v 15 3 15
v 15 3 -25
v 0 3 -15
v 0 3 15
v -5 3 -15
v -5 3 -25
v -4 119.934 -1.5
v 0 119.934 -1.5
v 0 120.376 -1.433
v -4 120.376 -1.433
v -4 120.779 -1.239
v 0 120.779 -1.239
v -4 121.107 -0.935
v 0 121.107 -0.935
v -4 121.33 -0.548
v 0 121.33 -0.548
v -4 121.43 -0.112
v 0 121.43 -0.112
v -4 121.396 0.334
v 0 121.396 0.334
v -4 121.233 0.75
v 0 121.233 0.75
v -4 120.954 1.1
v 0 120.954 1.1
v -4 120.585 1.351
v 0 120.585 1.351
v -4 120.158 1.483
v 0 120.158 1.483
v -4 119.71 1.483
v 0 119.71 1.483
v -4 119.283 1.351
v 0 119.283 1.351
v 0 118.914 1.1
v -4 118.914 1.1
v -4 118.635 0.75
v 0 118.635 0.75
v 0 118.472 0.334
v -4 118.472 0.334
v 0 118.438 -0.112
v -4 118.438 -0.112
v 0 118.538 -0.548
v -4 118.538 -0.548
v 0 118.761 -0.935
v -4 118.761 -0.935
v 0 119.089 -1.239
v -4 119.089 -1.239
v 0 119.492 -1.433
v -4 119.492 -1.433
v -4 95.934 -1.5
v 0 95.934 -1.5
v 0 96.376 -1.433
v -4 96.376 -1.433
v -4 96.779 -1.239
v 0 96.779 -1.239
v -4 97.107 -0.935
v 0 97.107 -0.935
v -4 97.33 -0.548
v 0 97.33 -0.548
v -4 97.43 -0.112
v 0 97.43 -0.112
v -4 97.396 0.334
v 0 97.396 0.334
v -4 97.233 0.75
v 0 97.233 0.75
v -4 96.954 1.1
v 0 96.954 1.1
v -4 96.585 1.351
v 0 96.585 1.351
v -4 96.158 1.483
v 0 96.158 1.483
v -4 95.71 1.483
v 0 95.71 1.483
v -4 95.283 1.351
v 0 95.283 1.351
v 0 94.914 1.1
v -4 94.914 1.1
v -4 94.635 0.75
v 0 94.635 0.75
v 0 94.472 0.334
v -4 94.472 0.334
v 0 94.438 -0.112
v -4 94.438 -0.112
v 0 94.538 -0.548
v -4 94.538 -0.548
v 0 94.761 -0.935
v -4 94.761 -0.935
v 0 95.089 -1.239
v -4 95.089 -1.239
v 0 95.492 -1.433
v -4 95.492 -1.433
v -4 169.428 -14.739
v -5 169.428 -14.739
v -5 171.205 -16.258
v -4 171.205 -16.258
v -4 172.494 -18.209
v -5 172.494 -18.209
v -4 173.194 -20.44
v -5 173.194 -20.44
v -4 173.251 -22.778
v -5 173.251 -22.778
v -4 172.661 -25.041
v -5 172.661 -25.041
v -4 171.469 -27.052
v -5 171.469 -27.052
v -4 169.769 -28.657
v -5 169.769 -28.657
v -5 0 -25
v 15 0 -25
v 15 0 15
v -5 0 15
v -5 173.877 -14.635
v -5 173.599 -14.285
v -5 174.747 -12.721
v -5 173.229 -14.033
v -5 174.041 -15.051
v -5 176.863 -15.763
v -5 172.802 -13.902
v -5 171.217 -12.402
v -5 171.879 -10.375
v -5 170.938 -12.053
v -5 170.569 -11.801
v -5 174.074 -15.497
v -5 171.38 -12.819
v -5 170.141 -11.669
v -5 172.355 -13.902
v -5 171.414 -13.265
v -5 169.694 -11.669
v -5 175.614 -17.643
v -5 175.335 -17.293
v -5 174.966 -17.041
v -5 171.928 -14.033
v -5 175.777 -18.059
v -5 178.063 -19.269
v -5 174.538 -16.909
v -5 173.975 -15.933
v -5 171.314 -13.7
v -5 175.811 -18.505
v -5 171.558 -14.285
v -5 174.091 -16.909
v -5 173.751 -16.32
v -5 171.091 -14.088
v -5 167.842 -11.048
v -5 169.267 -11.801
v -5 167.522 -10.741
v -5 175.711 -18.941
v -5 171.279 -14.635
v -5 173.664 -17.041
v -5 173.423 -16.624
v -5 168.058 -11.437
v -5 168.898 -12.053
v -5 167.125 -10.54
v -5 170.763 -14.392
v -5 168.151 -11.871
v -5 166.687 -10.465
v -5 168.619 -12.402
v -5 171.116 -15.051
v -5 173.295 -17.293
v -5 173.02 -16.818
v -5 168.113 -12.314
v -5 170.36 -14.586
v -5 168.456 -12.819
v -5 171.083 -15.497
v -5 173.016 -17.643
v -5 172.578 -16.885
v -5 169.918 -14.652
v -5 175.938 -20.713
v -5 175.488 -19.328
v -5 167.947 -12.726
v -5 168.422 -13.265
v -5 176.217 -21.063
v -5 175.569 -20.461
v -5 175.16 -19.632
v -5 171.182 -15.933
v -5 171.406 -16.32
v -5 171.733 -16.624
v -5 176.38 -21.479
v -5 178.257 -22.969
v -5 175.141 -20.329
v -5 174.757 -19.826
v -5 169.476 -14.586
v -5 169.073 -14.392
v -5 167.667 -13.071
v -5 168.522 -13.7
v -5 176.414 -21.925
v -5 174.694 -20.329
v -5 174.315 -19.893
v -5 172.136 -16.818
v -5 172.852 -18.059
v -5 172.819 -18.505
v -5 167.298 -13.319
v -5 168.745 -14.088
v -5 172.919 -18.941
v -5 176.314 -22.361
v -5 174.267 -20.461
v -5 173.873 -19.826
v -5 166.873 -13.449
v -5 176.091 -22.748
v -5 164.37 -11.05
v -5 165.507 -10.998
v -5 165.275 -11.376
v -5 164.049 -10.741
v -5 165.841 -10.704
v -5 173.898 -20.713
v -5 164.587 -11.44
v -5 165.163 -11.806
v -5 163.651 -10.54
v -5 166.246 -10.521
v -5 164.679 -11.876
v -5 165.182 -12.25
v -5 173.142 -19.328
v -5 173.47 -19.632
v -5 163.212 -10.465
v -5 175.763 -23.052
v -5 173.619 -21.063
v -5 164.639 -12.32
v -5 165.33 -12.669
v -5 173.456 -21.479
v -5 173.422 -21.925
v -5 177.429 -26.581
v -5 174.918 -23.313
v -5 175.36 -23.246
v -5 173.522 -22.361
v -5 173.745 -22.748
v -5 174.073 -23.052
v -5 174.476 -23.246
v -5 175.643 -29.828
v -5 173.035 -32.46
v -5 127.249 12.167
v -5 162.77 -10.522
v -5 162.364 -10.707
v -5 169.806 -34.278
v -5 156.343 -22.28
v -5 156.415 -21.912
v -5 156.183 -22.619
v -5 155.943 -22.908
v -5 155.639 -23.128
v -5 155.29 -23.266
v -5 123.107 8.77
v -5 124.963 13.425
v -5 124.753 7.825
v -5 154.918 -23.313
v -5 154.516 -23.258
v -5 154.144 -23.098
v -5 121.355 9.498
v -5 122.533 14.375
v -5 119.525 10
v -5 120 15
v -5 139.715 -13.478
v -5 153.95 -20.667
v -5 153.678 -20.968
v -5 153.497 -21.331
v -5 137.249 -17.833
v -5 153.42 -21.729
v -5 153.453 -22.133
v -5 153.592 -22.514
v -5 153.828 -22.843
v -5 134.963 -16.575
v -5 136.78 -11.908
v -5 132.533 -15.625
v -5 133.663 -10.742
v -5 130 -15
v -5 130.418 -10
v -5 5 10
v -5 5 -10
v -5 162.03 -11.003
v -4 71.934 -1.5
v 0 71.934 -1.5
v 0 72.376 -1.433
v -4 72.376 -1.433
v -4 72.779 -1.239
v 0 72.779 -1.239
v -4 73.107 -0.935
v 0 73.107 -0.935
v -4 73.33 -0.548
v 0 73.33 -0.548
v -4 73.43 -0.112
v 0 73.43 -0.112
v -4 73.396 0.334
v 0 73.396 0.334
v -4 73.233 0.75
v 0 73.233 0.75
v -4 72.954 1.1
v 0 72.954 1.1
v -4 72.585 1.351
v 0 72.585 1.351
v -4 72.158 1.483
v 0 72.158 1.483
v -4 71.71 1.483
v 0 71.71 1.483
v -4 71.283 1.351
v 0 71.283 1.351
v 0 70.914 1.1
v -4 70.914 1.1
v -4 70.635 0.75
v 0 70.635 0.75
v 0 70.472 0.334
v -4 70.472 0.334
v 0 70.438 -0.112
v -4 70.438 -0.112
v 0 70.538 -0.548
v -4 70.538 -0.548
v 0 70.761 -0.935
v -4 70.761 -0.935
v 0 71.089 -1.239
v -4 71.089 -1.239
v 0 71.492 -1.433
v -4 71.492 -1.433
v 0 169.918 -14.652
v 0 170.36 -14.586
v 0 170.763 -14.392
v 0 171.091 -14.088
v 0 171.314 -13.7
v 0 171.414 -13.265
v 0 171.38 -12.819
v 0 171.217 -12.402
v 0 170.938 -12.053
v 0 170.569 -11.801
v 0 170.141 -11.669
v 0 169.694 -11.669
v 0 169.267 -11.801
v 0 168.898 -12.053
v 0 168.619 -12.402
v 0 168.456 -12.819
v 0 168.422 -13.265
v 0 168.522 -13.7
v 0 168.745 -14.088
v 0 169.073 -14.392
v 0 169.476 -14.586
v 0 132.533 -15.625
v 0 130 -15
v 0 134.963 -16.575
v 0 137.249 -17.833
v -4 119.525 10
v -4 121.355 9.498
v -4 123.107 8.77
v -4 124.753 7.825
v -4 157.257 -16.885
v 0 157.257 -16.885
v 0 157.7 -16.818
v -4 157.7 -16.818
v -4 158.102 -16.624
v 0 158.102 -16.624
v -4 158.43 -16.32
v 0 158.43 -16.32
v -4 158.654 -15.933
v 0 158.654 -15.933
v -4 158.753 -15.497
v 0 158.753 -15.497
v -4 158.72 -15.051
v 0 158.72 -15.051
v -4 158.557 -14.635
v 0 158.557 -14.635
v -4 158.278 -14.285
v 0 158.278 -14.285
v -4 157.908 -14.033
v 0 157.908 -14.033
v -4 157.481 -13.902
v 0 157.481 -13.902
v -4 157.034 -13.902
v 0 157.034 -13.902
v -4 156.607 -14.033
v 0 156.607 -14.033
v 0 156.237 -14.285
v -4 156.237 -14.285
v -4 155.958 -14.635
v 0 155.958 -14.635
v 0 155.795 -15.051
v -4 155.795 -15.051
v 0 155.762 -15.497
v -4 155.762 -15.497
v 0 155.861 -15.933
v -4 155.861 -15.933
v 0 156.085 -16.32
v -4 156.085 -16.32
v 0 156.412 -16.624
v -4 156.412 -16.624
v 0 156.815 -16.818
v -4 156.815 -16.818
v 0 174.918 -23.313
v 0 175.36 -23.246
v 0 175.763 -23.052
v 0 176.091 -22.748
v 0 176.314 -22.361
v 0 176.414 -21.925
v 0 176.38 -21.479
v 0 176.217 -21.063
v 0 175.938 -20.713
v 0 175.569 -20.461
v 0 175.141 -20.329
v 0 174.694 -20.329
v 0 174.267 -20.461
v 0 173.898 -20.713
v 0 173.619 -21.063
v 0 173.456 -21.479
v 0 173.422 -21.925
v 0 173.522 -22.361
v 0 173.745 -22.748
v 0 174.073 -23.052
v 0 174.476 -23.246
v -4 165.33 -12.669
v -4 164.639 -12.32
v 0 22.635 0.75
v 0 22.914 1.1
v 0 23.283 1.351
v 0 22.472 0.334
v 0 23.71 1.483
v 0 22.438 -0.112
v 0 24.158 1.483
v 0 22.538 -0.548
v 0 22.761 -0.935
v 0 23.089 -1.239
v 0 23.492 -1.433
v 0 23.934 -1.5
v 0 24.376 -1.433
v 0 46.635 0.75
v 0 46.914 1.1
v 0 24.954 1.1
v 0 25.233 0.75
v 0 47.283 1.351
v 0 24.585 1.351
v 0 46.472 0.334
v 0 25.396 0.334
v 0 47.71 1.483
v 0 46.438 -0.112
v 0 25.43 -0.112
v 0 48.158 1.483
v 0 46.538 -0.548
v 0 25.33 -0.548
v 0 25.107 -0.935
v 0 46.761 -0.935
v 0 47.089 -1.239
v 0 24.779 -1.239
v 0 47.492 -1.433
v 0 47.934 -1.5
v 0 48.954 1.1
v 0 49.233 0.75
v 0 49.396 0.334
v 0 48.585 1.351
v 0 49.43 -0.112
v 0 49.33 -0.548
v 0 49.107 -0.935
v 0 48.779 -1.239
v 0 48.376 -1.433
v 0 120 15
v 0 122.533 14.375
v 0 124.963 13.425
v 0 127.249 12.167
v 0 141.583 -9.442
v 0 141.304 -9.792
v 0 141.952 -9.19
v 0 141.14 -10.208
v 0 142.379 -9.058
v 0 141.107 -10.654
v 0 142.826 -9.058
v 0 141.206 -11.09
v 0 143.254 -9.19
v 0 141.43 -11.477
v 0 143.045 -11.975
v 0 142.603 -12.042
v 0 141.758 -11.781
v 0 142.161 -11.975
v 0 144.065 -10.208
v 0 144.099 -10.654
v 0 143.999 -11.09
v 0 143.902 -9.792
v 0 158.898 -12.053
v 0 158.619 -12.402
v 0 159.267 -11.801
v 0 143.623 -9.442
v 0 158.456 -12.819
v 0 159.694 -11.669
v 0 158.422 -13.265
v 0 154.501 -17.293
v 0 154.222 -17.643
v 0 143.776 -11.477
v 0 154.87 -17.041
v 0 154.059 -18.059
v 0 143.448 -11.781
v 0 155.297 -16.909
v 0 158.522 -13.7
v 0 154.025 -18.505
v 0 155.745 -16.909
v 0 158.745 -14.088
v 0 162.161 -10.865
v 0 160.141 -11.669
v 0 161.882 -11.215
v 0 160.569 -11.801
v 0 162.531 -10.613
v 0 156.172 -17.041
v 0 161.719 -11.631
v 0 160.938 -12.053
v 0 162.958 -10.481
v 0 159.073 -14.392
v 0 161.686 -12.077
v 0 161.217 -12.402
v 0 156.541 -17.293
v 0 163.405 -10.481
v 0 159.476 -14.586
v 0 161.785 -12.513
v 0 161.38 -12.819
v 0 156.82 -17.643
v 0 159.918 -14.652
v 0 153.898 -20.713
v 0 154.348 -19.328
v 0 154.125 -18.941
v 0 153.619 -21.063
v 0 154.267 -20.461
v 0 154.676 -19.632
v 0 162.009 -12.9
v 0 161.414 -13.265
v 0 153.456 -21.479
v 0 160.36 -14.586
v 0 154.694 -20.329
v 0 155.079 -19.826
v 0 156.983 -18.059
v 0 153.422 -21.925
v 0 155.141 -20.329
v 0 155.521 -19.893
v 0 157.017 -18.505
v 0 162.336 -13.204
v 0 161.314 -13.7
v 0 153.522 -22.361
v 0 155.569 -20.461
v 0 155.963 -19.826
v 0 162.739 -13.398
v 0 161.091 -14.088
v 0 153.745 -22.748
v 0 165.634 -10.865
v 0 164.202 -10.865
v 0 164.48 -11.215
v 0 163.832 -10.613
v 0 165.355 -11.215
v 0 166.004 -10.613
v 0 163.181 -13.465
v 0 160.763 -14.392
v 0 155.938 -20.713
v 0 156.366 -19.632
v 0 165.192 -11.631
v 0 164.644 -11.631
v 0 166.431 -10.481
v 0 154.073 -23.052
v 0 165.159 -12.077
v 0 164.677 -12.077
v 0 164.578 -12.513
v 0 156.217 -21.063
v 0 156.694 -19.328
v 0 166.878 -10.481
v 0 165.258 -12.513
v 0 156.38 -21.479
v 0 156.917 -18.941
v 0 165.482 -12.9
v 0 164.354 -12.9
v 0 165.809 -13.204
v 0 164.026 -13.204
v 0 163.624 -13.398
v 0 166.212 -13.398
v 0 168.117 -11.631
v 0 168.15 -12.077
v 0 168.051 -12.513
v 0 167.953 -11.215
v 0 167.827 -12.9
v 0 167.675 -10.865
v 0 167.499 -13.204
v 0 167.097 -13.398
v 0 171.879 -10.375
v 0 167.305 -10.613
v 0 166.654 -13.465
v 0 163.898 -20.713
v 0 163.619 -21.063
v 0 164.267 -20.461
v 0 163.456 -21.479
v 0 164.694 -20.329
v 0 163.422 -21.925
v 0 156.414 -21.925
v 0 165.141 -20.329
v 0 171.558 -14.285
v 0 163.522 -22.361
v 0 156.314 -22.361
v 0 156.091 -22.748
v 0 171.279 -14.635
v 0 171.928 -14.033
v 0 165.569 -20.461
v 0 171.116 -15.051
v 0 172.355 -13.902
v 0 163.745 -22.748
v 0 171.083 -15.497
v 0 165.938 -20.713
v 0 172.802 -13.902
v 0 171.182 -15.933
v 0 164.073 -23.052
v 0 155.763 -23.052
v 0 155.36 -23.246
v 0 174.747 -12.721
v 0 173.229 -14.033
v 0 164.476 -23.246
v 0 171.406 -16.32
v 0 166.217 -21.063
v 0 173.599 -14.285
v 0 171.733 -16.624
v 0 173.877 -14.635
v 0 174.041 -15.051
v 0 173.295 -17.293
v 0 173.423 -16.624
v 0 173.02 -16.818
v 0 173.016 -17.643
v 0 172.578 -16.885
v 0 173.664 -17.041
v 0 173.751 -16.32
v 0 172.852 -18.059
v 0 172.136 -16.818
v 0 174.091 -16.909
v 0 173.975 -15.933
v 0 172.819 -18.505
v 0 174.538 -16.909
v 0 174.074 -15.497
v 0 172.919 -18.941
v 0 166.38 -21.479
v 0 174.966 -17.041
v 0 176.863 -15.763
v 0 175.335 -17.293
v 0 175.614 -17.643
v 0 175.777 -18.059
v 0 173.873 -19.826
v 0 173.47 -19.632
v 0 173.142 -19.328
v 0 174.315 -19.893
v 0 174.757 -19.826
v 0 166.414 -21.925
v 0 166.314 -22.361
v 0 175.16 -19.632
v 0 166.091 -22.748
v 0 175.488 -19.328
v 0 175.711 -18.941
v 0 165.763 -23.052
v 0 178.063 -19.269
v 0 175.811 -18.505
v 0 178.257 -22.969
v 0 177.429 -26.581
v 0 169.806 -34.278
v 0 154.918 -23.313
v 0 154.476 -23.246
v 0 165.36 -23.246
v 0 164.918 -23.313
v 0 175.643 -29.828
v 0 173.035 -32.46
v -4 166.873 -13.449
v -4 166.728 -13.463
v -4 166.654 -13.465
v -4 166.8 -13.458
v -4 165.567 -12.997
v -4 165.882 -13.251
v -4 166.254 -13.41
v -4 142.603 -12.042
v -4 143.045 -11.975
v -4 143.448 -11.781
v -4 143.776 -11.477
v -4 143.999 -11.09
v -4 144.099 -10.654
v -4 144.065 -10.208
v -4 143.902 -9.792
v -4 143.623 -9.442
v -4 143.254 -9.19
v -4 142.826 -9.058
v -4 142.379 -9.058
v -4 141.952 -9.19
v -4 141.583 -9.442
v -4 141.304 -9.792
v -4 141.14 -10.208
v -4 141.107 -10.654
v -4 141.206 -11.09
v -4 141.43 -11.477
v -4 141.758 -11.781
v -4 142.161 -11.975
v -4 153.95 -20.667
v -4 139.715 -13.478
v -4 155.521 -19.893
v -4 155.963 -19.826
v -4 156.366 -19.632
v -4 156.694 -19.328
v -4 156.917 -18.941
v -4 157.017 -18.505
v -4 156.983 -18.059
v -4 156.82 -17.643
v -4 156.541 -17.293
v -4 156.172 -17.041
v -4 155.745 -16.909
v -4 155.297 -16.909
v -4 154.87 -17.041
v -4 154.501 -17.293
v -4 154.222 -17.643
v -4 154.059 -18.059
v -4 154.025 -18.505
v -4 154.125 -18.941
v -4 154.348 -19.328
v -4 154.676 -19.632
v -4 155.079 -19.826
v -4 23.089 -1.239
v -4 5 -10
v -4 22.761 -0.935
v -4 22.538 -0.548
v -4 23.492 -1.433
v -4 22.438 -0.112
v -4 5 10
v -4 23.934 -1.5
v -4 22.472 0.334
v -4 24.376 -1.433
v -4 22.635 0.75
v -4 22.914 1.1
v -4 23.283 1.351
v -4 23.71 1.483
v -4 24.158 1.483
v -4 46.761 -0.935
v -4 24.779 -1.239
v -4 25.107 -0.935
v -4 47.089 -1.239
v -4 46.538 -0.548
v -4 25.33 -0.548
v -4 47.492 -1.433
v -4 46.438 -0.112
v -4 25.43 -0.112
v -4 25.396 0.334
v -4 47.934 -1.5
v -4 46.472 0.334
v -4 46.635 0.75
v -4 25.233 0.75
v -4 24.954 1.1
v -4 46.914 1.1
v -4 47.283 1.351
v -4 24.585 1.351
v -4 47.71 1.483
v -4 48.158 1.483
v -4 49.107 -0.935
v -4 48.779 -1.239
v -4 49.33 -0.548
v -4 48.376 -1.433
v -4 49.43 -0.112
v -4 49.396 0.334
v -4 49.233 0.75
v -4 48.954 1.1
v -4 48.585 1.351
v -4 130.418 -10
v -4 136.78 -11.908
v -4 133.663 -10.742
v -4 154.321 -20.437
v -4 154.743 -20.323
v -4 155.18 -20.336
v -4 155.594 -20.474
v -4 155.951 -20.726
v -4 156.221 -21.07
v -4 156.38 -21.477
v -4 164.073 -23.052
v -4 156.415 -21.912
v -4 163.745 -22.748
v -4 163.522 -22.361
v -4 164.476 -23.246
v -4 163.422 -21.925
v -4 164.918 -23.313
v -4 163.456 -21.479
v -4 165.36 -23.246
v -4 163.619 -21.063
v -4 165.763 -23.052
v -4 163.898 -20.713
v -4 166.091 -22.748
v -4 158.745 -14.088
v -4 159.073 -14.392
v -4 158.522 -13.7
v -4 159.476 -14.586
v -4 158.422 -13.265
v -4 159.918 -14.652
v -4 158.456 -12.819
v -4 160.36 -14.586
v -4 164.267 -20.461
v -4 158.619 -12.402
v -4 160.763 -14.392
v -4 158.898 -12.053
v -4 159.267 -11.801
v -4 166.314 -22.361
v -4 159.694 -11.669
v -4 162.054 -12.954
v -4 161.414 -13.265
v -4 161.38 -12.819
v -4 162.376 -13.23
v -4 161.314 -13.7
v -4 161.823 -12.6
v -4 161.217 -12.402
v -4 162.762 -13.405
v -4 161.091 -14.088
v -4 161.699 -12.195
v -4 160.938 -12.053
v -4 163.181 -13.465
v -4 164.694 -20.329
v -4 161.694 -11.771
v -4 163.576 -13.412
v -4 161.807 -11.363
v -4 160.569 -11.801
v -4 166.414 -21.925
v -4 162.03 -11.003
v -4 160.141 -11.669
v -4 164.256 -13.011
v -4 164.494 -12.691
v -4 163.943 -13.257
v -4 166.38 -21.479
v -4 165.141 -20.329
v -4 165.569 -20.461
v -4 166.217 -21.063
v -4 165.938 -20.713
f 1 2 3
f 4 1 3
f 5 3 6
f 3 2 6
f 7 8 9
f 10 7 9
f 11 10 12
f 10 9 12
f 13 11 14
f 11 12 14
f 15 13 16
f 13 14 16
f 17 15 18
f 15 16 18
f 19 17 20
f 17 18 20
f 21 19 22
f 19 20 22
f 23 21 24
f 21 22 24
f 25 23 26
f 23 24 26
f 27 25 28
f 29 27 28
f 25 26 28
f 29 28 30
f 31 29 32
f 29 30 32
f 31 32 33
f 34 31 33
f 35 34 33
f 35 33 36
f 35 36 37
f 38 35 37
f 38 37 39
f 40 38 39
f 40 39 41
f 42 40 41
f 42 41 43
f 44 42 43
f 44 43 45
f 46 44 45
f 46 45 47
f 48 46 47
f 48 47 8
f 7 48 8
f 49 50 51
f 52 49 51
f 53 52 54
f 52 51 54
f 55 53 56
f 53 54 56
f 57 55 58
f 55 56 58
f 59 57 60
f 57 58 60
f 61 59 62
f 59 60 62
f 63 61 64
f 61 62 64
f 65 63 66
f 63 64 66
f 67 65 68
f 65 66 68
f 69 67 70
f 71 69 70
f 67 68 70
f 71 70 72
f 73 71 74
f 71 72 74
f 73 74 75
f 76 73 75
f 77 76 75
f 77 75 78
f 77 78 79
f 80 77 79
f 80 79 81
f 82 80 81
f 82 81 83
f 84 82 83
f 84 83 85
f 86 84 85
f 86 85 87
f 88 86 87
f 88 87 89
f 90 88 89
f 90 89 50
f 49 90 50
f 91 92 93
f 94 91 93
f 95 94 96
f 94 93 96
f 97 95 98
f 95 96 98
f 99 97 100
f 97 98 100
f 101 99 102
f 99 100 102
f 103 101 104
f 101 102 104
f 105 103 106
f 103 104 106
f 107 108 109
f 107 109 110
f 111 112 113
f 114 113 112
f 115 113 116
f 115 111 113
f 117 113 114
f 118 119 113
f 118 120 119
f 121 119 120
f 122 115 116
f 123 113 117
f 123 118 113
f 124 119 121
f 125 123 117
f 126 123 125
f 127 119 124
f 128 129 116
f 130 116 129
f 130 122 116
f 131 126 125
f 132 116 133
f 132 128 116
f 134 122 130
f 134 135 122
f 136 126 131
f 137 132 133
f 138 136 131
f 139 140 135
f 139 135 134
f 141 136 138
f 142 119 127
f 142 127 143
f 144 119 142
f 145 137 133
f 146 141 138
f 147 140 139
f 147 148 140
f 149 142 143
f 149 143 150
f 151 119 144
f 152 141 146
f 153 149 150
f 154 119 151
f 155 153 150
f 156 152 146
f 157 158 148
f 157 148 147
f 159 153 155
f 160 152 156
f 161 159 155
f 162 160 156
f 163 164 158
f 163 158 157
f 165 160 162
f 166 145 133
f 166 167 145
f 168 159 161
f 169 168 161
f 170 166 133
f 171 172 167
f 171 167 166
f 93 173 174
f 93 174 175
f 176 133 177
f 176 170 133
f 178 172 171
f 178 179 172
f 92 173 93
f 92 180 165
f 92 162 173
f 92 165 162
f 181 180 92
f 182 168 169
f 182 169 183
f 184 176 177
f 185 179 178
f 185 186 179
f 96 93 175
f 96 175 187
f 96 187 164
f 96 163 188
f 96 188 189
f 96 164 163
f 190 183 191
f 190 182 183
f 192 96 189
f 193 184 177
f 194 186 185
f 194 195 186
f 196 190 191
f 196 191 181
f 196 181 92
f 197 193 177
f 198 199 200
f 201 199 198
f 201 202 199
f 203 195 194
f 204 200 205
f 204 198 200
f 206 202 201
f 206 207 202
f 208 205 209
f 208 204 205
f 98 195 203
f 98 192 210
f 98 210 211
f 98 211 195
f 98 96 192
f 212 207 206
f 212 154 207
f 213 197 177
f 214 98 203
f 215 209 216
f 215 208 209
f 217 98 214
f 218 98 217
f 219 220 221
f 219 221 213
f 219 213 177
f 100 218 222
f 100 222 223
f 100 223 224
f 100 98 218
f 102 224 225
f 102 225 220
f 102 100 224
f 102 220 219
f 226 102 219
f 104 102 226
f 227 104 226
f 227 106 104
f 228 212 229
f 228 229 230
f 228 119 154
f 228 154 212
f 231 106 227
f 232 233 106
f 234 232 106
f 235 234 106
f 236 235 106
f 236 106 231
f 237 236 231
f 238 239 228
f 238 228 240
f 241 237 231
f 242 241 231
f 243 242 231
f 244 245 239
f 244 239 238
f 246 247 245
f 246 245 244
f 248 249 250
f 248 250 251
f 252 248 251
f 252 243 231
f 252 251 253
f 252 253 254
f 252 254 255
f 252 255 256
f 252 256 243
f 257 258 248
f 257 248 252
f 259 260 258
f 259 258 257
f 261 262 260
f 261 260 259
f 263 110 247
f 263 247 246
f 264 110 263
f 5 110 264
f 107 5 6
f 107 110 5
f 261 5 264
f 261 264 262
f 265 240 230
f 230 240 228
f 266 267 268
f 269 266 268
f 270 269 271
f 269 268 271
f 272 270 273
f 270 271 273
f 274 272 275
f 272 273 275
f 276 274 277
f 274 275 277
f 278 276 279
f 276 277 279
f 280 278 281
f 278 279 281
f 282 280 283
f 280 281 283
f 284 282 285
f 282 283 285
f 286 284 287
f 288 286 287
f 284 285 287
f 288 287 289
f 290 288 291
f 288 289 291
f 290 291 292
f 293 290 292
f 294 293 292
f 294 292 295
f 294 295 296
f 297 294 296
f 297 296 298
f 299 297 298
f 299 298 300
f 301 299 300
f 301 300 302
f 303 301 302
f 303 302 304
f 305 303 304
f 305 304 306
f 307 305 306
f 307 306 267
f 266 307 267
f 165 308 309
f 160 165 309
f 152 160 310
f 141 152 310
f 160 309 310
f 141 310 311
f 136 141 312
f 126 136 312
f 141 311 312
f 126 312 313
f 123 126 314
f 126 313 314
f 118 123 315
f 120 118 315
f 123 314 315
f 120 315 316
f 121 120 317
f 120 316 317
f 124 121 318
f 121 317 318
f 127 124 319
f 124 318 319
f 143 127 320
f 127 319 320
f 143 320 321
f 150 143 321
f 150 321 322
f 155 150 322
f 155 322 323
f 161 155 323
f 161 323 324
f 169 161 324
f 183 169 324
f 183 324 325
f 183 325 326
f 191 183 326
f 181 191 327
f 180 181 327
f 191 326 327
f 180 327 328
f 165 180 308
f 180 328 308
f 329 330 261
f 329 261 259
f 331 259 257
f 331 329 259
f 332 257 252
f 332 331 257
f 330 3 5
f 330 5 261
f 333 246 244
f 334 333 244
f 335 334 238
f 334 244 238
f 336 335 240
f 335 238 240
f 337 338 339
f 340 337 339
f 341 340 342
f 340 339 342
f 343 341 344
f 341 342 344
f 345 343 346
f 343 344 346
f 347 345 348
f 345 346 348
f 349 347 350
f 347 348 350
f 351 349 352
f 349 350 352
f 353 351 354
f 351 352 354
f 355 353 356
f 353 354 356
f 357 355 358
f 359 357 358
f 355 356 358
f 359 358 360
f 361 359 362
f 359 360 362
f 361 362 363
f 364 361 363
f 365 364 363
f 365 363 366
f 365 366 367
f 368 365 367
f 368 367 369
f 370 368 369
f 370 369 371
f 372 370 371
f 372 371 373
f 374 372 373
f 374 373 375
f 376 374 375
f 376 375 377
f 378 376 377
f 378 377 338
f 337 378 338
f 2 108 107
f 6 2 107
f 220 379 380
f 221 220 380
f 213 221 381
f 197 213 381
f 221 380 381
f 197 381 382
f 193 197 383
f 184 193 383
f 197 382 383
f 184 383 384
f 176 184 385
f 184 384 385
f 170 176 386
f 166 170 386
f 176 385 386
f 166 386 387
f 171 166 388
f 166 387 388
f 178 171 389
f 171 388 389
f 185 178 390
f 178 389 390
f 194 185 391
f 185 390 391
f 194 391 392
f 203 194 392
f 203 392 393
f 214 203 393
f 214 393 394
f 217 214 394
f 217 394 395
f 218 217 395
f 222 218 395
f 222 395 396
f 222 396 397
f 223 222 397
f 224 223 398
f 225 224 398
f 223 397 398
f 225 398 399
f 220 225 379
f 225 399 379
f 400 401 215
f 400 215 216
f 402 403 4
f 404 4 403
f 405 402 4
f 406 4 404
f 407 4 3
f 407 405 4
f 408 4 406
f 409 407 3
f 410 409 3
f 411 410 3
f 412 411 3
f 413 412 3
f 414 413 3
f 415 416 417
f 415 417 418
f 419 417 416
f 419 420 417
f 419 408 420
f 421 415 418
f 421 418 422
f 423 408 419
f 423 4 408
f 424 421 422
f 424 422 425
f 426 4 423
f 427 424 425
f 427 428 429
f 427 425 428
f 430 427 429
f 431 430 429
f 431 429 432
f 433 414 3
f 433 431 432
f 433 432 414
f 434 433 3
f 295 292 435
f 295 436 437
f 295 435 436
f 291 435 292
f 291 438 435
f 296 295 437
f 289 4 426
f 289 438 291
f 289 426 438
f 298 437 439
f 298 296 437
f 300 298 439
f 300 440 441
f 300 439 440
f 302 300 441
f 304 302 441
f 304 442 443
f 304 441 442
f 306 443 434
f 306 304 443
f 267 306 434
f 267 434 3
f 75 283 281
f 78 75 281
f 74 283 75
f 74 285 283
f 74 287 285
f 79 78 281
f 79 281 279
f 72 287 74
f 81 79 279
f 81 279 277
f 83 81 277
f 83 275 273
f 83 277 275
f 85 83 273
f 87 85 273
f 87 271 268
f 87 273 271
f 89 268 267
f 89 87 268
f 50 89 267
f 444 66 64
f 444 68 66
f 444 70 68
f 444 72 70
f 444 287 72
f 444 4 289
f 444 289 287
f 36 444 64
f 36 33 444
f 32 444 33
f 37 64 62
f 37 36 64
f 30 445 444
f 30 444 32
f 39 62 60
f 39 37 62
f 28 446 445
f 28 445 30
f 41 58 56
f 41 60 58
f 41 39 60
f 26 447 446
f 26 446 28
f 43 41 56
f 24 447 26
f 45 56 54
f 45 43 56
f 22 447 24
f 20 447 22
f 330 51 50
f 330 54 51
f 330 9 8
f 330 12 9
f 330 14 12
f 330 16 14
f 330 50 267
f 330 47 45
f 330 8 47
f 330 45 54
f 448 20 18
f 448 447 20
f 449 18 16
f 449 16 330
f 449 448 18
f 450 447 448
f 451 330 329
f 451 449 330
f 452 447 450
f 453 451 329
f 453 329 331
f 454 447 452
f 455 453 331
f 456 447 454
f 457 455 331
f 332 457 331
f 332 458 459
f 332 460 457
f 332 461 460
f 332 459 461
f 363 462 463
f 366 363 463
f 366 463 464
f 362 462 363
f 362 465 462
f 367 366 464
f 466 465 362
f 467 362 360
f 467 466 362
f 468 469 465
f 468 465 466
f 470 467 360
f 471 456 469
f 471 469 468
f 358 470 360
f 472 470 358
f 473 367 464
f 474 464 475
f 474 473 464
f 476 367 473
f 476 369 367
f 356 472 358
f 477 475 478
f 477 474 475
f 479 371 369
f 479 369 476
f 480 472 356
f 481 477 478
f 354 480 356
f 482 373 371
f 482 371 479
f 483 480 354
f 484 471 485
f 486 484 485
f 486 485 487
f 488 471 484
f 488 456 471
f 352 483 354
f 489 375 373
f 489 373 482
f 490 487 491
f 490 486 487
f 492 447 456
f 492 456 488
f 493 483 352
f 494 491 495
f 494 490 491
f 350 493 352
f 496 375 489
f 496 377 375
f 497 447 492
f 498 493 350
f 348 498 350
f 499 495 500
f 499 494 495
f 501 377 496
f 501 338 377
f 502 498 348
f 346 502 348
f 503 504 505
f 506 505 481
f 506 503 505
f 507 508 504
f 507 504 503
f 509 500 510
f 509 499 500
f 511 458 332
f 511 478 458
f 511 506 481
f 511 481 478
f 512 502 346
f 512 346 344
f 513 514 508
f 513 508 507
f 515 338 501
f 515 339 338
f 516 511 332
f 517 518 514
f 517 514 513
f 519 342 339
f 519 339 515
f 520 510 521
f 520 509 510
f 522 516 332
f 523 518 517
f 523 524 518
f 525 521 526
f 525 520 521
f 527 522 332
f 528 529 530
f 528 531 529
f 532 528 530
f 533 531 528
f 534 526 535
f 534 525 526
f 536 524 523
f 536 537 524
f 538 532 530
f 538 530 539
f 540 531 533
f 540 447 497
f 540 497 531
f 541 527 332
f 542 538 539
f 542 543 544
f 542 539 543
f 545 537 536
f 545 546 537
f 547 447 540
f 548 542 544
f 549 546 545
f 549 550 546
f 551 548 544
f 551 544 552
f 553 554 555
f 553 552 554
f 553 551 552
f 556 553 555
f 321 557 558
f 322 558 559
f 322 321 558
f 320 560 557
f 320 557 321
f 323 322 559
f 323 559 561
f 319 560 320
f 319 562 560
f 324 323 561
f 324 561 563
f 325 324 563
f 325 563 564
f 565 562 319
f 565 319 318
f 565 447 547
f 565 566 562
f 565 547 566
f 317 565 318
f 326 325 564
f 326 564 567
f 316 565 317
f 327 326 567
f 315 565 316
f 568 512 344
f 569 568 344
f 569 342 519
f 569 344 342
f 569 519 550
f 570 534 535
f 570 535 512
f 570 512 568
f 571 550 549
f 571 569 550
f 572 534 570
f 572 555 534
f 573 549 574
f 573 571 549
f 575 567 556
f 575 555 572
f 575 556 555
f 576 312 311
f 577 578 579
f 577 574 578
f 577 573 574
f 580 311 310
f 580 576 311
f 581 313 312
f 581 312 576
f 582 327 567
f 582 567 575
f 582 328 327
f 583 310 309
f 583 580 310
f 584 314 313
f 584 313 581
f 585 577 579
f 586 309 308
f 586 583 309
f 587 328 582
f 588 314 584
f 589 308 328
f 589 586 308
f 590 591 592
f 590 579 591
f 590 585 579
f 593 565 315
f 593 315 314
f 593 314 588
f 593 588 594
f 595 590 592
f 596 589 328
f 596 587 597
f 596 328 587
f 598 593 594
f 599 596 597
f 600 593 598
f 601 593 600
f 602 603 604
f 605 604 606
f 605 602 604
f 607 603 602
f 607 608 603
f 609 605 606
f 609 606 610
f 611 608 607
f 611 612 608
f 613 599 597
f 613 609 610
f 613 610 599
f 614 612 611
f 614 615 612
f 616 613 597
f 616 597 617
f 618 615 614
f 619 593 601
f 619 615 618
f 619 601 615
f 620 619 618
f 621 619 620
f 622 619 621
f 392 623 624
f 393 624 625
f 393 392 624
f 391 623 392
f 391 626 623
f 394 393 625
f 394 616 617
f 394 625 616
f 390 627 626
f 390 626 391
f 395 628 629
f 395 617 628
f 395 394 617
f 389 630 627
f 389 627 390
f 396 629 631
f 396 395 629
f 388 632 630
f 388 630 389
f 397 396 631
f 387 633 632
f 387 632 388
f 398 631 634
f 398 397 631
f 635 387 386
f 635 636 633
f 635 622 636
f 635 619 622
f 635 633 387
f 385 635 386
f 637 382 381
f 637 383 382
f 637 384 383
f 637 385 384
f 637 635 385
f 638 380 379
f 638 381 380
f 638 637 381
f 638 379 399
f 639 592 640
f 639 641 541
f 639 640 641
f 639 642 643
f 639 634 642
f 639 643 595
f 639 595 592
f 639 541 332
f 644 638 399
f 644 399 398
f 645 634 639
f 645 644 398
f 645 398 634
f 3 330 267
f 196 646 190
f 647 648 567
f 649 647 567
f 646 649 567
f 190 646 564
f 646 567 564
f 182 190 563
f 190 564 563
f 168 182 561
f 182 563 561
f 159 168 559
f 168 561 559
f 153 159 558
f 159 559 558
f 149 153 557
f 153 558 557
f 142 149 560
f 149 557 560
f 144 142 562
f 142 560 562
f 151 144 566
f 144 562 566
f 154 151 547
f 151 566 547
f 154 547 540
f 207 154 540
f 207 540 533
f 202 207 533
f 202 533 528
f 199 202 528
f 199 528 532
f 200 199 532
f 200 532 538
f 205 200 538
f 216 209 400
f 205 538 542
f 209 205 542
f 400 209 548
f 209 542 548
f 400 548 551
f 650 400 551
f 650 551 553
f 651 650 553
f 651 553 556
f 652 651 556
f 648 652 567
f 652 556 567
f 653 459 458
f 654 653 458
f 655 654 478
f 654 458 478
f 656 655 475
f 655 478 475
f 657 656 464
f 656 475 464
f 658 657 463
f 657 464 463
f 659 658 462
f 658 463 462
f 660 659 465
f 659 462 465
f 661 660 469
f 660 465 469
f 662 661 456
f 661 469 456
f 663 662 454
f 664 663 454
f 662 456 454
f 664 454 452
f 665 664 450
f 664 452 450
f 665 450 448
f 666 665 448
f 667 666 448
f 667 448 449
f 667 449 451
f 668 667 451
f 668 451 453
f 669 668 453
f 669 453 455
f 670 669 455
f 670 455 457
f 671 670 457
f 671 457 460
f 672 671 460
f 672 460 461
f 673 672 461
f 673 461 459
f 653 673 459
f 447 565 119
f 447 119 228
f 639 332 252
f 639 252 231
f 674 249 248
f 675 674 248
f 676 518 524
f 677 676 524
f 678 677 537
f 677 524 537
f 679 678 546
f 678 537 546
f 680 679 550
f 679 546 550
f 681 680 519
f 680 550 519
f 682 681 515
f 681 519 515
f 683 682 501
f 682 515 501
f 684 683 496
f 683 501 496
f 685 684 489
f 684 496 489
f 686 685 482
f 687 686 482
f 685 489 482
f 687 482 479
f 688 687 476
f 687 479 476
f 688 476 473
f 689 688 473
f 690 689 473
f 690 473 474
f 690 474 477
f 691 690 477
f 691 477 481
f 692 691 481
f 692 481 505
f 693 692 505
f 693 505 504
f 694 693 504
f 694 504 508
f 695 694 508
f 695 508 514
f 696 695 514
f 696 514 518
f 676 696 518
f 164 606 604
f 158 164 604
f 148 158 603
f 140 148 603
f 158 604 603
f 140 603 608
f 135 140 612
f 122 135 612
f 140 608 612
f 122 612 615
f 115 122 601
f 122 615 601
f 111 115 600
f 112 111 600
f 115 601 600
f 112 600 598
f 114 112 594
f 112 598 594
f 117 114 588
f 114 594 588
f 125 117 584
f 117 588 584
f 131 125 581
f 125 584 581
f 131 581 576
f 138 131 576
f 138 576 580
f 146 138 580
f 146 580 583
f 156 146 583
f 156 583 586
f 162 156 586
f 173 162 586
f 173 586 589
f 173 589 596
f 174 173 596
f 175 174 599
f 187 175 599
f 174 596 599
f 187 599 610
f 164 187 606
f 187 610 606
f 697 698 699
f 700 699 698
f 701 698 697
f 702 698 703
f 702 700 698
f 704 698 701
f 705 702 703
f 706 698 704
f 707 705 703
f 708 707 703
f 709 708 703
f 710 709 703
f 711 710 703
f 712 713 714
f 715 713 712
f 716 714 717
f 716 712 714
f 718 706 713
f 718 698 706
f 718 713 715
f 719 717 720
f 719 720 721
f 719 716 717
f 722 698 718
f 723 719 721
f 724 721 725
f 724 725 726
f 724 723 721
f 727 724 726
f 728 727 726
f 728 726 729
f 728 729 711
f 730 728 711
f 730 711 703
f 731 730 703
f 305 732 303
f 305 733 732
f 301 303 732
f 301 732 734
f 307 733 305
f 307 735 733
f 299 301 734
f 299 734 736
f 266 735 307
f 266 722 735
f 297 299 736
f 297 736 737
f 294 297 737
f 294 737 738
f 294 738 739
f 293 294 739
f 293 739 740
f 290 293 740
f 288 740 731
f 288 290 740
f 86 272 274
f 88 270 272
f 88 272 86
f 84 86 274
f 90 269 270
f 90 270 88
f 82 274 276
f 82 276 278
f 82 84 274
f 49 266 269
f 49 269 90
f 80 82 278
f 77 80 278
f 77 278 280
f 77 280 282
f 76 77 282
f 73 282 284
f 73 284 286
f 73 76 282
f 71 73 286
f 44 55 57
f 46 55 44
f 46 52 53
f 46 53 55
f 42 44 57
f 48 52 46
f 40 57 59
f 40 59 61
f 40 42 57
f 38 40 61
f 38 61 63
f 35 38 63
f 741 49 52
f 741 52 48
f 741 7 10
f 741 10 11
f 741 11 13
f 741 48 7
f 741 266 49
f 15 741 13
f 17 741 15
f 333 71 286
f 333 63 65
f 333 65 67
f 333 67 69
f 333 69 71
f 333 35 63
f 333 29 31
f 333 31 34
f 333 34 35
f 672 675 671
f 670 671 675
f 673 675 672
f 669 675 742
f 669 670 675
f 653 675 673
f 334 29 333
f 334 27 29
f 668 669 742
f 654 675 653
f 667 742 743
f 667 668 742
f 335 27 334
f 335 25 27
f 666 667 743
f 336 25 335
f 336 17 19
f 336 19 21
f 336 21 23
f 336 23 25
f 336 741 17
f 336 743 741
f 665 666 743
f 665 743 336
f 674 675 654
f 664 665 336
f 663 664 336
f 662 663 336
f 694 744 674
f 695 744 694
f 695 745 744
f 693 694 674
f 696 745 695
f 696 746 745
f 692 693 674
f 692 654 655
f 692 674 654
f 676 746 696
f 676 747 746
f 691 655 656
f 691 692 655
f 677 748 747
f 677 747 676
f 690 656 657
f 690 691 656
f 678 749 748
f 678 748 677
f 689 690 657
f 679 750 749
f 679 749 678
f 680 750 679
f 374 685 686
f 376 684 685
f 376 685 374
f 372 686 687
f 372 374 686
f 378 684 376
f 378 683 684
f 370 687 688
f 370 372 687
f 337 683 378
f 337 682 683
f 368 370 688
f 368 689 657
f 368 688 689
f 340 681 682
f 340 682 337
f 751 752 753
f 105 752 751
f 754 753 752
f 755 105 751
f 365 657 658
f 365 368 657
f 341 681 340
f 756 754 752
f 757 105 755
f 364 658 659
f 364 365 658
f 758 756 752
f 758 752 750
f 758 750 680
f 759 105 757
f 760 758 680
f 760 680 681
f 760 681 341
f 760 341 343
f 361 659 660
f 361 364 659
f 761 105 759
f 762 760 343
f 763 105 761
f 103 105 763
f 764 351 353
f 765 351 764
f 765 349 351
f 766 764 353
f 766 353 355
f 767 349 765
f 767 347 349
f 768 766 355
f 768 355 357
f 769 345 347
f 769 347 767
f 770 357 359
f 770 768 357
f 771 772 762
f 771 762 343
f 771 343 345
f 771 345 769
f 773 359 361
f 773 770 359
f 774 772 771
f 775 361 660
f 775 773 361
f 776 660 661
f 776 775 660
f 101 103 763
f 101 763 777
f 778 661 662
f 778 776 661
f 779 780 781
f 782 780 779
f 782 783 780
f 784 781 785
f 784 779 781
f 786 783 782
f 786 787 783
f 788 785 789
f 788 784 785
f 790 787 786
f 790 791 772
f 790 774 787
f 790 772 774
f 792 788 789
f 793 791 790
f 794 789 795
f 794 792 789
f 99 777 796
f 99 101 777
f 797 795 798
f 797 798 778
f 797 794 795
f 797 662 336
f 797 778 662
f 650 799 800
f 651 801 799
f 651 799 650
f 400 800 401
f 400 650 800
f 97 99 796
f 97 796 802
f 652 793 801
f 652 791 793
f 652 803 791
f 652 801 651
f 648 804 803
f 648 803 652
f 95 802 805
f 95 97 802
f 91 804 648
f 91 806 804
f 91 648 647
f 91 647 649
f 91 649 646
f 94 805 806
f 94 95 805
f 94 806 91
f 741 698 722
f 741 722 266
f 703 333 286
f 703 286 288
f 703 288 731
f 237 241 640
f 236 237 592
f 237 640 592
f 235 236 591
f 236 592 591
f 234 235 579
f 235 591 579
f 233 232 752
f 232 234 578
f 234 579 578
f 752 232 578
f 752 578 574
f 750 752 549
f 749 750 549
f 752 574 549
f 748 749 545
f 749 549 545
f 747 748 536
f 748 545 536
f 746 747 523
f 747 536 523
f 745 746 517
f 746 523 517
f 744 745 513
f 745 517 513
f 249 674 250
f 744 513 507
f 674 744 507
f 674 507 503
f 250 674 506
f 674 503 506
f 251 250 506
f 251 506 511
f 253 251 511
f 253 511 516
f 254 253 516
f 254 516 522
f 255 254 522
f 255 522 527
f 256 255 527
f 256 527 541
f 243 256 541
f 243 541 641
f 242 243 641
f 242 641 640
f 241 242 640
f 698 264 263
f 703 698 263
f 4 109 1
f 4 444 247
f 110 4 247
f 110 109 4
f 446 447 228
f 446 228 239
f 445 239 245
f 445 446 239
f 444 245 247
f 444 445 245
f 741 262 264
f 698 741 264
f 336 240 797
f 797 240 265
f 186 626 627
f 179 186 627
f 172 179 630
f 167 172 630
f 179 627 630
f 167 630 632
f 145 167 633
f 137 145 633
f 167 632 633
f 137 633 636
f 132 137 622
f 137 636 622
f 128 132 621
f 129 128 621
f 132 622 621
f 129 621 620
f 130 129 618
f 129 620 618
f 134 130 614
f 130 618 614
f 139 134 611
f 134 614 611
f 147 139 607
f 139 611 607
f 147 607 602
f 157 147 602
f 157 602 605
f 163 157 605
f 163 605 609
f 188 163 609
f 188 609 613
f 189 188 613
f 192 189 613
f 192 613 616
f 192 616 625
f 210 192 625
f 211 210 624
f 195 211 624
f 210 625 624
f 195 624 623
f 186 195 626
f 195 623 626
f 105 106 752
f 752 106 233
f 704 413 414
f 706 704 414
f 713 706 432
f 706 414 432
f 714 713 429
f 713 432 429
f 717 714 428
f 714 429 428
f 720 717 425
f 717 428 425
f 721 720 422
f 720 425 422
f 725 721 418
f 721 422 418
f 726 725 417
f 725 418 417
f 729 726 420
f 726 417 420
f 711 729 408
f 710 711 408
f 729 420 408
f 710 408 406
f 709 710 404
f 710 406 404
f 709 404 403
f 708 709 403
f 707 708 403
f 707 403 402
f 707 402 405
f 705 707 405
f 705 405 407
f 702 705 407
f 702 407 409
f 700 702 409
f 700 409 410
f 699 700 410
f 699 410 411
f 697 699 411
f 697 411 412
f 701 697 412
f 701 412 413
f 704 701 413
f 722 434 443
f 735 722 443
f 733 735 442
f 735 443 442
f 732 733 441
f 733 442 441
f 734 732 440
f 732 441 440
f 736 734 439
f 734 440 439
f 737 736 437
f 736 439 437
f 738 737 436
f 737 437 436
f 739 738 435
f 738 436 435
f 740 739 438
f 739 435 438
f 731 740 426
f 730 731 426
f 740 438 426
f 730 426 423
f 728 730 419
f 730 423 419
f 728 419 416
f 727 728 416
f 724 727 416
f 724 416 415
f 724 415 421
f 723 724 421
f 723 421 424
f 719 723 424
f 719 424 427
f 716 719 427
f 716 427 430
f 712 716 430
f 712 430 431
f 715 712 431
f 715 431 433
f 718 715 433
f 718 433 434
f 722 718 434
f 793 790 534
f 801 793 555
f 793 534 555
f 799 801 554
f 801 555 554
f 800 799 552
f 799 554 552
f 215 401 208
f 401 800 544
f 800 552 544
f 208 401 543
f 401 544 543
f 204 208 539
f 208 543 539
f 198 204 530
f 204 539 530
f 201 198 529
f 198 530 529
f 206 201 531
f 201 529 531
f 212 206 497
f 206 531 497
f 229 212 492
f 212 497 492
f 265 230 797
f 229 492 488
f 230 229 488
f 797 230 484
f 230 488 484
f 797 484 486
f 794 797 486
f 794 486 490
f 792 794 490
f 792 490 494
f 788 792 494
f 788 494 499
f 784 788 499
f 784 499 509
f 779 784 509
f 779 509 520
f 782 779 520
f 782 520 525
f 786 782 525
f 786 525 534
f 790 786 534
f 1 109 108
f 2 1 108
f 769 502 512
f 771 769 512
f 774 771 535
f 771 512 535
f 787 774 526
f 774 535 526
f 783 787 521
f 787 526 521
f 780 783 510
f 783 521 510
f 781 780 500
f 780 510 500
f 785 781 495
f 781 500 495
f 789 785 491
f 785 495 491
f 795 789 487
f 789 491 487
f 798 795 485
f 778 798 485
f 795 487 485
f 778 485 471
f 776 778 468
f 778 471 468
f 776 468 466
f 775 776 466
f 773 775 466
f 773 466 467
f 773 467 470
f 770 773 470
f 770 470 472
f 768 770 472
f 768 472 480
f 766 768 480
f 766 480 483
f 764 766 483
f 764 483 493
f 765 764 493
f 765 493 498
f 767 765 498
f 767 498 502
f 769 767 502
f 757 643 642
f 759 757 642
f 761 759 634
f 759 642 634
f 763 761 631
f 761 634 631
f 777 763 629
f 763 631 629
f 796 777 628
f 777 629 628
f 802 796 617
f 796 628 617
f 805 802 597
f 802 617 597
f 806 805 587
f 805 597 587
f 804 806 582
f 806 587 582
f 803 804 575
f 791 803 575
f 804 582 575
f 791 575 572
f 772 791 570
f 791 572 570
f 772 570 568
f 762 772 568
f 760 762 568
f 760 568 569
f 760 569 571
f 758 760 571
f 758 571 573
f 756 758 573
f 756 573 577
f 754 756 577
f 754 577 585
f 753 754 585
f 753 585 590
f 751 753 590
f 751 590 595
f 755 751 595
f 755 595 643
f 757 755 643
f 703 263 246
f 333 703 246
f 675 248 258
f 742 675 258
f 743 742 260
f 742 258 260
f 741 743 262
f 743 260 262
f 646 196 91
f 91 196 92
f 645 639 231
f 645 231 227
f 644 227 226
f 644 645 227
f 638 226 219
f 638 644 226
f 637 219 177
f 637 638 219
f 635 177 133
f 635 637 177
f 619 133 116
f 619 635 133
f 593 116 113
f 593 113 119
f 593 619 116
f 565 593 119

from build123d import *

# Parameters (mm, degrees)
SKETCH_1_R          = 1.5
EXTRUDE_2_DEPTH     = 5
CUT_EXTRUDE_2_DEPTH = 1
SKETCH_4_W          = 20
SKETCH_4_H          = 40
EXTRUDE_3_DEPTH     = 3


with BuildPart() as part:
    # 草图1 → 凸台-拉伸2 (new body)
    with BuildSketch(Plane(origin=(0, 0, 0), x_dir=(0, 0, -1), z_dir=(1, 0, 0))):
        with BuildLine():
            Line((-15, 0), (15, 0))
            Line((15, 0), (15, 130))
            ThreePointArc((15, 130), (16.060667235, 133.763397528), (17.833287426, 137.248507798))
            Line((17.833287426, 137.248507798), (34.277601095, 169.80605943))
            ThreePointArc((34.277601095, 169.80605943), (22.969406924, 178.256928012), (10.37531975, 171.878730504))
            Line((10.37531975, 171.878730504), (-12.166712574, 127.248507798))
            ThreePointArc((-12.166712574, 127.248507798), (-13.939332765, 123.763397528), (-15, 120))
            Line((-15, 120), (-15, 0))
        make_face()
        with Locations((0, 23.934052351)):
            Circle(SKETCH_1_R, mode=Mode.SUBTRACT)
        with Locations((0, 47.934052351)):
            Circle(SKETCH_1_R, mode=Mode.SUBTRACT)
        with Locations((0, 71.934052351)):
            Circle(SKETCH_1_R, mode=Mode.SUBTRACT)
        with Locations((0, 95.934052351)):
            Circle(SKETCH_1_R, mode=Mode.SUBTRACT)
        with Locations((10.541707006, 142.602806473)):
            Circle(SKETCH_1_R, mode=Mode.SUBTRACT)
        with Locations((0, 119.934052351)):
            Circle(SKETCH_1_R, mode=Mode.SUBTRACT)
        with Locations((21.812723168, 164.917917825)):
            Circle(SKETCH_1_R, mode=Mode.SUBTRACT)
        with Locations((11.964645637, 166.654399602)):
            Circle(SKETCH_1_R, mode=Mode.SUBTRACT)
        with Locations((11.964645637, 163.181436049)):
            Circle(SKETCH_1_R, mode=Mode.SUBTRACT)
        with Locations((13.15246913, 159.917917825)):
            Circle(SKETCH_1_R, mode=Mode.SUBTRACT)
        with Locations((15.384847071, 157.257473394)):
            Circle(SKETCH_1_R, mode=Mode.SUBTRACT)
        with Locations((21.812723168, 154.917917825)):
            Circle(SKETCH_1_R, mode=Mode.SUBTRACT)
        with Locations((18.392521734, 155.520991617)):
            Circle(SKETCH_1_R, mode=Mode.SUBTRACT)
        with Locations((13.15246913, 169.917917825)):
            Circle(SKETCH_1_R, mode=Mode.SUBTRACT)
        with Locations((15.384847071, 172.578362256)):
            Circle(SKETCH_1_R, mode=Mode.SUBTRACT)
        with Locations((18.392521734, 174.314844033)):
            Circle(SKETCH_1_R, mode=Mode.SUBTRACT)
        with Locations((21.812723168, 174.917917825)):
            Circle(SKETCH_1_R, mode=Mode.SUBTRACT)
    extrude(amount=-EXTRUDE_2_DEPTH)

    # 草图3 → 切除-拉伸2 (cut)
    with BuildSketch(Plane.ZY.offset(5)):
        with BuildLine():
            Line((-10, 5), (10, 5))
            Line((10, 5), (10, 119.524724411))
            ThreePointArc((10, 119.524724411), (9.161705076, 122.242477333), (7.82549521, 124.753147068))
            Line((7.82549521, 124.753147068), (-14.73885303, 169.427552317))
            ThreePointArc((-14.73885303, 169.427552317), (-21.607154469, 173.304465594), (-28.657153069, 169.768713769))
            Line((-28.657153069, 169.768713769), (-13.477541954, 139.715104809))
            ThreePointArc((-13.477541954, 139.715104809), (-11.272736422, 135.241025308), (-10, 130.418298195))
            Line((-10, 130.418298195), (-10, 5))
        make_face()
    extrude(amount=-CUT_EXTRUDE_2_DEPTH, mode=Mode.SUBTRACT)

    # 草图4 → 凸台-拉伸3 (add)
    with BuildSketch(Plane(origin=(0, 0, 0), x_dir=(-1, 0, 0), z_dir=(0, -1, 0))):
        with Locations((-5, 5)):
            Rectangle(SKETCH_4_W, SKETCH_4_H)
    extrude(amount=-EXTRUDE_3_DEPTH)


solid = part.part
